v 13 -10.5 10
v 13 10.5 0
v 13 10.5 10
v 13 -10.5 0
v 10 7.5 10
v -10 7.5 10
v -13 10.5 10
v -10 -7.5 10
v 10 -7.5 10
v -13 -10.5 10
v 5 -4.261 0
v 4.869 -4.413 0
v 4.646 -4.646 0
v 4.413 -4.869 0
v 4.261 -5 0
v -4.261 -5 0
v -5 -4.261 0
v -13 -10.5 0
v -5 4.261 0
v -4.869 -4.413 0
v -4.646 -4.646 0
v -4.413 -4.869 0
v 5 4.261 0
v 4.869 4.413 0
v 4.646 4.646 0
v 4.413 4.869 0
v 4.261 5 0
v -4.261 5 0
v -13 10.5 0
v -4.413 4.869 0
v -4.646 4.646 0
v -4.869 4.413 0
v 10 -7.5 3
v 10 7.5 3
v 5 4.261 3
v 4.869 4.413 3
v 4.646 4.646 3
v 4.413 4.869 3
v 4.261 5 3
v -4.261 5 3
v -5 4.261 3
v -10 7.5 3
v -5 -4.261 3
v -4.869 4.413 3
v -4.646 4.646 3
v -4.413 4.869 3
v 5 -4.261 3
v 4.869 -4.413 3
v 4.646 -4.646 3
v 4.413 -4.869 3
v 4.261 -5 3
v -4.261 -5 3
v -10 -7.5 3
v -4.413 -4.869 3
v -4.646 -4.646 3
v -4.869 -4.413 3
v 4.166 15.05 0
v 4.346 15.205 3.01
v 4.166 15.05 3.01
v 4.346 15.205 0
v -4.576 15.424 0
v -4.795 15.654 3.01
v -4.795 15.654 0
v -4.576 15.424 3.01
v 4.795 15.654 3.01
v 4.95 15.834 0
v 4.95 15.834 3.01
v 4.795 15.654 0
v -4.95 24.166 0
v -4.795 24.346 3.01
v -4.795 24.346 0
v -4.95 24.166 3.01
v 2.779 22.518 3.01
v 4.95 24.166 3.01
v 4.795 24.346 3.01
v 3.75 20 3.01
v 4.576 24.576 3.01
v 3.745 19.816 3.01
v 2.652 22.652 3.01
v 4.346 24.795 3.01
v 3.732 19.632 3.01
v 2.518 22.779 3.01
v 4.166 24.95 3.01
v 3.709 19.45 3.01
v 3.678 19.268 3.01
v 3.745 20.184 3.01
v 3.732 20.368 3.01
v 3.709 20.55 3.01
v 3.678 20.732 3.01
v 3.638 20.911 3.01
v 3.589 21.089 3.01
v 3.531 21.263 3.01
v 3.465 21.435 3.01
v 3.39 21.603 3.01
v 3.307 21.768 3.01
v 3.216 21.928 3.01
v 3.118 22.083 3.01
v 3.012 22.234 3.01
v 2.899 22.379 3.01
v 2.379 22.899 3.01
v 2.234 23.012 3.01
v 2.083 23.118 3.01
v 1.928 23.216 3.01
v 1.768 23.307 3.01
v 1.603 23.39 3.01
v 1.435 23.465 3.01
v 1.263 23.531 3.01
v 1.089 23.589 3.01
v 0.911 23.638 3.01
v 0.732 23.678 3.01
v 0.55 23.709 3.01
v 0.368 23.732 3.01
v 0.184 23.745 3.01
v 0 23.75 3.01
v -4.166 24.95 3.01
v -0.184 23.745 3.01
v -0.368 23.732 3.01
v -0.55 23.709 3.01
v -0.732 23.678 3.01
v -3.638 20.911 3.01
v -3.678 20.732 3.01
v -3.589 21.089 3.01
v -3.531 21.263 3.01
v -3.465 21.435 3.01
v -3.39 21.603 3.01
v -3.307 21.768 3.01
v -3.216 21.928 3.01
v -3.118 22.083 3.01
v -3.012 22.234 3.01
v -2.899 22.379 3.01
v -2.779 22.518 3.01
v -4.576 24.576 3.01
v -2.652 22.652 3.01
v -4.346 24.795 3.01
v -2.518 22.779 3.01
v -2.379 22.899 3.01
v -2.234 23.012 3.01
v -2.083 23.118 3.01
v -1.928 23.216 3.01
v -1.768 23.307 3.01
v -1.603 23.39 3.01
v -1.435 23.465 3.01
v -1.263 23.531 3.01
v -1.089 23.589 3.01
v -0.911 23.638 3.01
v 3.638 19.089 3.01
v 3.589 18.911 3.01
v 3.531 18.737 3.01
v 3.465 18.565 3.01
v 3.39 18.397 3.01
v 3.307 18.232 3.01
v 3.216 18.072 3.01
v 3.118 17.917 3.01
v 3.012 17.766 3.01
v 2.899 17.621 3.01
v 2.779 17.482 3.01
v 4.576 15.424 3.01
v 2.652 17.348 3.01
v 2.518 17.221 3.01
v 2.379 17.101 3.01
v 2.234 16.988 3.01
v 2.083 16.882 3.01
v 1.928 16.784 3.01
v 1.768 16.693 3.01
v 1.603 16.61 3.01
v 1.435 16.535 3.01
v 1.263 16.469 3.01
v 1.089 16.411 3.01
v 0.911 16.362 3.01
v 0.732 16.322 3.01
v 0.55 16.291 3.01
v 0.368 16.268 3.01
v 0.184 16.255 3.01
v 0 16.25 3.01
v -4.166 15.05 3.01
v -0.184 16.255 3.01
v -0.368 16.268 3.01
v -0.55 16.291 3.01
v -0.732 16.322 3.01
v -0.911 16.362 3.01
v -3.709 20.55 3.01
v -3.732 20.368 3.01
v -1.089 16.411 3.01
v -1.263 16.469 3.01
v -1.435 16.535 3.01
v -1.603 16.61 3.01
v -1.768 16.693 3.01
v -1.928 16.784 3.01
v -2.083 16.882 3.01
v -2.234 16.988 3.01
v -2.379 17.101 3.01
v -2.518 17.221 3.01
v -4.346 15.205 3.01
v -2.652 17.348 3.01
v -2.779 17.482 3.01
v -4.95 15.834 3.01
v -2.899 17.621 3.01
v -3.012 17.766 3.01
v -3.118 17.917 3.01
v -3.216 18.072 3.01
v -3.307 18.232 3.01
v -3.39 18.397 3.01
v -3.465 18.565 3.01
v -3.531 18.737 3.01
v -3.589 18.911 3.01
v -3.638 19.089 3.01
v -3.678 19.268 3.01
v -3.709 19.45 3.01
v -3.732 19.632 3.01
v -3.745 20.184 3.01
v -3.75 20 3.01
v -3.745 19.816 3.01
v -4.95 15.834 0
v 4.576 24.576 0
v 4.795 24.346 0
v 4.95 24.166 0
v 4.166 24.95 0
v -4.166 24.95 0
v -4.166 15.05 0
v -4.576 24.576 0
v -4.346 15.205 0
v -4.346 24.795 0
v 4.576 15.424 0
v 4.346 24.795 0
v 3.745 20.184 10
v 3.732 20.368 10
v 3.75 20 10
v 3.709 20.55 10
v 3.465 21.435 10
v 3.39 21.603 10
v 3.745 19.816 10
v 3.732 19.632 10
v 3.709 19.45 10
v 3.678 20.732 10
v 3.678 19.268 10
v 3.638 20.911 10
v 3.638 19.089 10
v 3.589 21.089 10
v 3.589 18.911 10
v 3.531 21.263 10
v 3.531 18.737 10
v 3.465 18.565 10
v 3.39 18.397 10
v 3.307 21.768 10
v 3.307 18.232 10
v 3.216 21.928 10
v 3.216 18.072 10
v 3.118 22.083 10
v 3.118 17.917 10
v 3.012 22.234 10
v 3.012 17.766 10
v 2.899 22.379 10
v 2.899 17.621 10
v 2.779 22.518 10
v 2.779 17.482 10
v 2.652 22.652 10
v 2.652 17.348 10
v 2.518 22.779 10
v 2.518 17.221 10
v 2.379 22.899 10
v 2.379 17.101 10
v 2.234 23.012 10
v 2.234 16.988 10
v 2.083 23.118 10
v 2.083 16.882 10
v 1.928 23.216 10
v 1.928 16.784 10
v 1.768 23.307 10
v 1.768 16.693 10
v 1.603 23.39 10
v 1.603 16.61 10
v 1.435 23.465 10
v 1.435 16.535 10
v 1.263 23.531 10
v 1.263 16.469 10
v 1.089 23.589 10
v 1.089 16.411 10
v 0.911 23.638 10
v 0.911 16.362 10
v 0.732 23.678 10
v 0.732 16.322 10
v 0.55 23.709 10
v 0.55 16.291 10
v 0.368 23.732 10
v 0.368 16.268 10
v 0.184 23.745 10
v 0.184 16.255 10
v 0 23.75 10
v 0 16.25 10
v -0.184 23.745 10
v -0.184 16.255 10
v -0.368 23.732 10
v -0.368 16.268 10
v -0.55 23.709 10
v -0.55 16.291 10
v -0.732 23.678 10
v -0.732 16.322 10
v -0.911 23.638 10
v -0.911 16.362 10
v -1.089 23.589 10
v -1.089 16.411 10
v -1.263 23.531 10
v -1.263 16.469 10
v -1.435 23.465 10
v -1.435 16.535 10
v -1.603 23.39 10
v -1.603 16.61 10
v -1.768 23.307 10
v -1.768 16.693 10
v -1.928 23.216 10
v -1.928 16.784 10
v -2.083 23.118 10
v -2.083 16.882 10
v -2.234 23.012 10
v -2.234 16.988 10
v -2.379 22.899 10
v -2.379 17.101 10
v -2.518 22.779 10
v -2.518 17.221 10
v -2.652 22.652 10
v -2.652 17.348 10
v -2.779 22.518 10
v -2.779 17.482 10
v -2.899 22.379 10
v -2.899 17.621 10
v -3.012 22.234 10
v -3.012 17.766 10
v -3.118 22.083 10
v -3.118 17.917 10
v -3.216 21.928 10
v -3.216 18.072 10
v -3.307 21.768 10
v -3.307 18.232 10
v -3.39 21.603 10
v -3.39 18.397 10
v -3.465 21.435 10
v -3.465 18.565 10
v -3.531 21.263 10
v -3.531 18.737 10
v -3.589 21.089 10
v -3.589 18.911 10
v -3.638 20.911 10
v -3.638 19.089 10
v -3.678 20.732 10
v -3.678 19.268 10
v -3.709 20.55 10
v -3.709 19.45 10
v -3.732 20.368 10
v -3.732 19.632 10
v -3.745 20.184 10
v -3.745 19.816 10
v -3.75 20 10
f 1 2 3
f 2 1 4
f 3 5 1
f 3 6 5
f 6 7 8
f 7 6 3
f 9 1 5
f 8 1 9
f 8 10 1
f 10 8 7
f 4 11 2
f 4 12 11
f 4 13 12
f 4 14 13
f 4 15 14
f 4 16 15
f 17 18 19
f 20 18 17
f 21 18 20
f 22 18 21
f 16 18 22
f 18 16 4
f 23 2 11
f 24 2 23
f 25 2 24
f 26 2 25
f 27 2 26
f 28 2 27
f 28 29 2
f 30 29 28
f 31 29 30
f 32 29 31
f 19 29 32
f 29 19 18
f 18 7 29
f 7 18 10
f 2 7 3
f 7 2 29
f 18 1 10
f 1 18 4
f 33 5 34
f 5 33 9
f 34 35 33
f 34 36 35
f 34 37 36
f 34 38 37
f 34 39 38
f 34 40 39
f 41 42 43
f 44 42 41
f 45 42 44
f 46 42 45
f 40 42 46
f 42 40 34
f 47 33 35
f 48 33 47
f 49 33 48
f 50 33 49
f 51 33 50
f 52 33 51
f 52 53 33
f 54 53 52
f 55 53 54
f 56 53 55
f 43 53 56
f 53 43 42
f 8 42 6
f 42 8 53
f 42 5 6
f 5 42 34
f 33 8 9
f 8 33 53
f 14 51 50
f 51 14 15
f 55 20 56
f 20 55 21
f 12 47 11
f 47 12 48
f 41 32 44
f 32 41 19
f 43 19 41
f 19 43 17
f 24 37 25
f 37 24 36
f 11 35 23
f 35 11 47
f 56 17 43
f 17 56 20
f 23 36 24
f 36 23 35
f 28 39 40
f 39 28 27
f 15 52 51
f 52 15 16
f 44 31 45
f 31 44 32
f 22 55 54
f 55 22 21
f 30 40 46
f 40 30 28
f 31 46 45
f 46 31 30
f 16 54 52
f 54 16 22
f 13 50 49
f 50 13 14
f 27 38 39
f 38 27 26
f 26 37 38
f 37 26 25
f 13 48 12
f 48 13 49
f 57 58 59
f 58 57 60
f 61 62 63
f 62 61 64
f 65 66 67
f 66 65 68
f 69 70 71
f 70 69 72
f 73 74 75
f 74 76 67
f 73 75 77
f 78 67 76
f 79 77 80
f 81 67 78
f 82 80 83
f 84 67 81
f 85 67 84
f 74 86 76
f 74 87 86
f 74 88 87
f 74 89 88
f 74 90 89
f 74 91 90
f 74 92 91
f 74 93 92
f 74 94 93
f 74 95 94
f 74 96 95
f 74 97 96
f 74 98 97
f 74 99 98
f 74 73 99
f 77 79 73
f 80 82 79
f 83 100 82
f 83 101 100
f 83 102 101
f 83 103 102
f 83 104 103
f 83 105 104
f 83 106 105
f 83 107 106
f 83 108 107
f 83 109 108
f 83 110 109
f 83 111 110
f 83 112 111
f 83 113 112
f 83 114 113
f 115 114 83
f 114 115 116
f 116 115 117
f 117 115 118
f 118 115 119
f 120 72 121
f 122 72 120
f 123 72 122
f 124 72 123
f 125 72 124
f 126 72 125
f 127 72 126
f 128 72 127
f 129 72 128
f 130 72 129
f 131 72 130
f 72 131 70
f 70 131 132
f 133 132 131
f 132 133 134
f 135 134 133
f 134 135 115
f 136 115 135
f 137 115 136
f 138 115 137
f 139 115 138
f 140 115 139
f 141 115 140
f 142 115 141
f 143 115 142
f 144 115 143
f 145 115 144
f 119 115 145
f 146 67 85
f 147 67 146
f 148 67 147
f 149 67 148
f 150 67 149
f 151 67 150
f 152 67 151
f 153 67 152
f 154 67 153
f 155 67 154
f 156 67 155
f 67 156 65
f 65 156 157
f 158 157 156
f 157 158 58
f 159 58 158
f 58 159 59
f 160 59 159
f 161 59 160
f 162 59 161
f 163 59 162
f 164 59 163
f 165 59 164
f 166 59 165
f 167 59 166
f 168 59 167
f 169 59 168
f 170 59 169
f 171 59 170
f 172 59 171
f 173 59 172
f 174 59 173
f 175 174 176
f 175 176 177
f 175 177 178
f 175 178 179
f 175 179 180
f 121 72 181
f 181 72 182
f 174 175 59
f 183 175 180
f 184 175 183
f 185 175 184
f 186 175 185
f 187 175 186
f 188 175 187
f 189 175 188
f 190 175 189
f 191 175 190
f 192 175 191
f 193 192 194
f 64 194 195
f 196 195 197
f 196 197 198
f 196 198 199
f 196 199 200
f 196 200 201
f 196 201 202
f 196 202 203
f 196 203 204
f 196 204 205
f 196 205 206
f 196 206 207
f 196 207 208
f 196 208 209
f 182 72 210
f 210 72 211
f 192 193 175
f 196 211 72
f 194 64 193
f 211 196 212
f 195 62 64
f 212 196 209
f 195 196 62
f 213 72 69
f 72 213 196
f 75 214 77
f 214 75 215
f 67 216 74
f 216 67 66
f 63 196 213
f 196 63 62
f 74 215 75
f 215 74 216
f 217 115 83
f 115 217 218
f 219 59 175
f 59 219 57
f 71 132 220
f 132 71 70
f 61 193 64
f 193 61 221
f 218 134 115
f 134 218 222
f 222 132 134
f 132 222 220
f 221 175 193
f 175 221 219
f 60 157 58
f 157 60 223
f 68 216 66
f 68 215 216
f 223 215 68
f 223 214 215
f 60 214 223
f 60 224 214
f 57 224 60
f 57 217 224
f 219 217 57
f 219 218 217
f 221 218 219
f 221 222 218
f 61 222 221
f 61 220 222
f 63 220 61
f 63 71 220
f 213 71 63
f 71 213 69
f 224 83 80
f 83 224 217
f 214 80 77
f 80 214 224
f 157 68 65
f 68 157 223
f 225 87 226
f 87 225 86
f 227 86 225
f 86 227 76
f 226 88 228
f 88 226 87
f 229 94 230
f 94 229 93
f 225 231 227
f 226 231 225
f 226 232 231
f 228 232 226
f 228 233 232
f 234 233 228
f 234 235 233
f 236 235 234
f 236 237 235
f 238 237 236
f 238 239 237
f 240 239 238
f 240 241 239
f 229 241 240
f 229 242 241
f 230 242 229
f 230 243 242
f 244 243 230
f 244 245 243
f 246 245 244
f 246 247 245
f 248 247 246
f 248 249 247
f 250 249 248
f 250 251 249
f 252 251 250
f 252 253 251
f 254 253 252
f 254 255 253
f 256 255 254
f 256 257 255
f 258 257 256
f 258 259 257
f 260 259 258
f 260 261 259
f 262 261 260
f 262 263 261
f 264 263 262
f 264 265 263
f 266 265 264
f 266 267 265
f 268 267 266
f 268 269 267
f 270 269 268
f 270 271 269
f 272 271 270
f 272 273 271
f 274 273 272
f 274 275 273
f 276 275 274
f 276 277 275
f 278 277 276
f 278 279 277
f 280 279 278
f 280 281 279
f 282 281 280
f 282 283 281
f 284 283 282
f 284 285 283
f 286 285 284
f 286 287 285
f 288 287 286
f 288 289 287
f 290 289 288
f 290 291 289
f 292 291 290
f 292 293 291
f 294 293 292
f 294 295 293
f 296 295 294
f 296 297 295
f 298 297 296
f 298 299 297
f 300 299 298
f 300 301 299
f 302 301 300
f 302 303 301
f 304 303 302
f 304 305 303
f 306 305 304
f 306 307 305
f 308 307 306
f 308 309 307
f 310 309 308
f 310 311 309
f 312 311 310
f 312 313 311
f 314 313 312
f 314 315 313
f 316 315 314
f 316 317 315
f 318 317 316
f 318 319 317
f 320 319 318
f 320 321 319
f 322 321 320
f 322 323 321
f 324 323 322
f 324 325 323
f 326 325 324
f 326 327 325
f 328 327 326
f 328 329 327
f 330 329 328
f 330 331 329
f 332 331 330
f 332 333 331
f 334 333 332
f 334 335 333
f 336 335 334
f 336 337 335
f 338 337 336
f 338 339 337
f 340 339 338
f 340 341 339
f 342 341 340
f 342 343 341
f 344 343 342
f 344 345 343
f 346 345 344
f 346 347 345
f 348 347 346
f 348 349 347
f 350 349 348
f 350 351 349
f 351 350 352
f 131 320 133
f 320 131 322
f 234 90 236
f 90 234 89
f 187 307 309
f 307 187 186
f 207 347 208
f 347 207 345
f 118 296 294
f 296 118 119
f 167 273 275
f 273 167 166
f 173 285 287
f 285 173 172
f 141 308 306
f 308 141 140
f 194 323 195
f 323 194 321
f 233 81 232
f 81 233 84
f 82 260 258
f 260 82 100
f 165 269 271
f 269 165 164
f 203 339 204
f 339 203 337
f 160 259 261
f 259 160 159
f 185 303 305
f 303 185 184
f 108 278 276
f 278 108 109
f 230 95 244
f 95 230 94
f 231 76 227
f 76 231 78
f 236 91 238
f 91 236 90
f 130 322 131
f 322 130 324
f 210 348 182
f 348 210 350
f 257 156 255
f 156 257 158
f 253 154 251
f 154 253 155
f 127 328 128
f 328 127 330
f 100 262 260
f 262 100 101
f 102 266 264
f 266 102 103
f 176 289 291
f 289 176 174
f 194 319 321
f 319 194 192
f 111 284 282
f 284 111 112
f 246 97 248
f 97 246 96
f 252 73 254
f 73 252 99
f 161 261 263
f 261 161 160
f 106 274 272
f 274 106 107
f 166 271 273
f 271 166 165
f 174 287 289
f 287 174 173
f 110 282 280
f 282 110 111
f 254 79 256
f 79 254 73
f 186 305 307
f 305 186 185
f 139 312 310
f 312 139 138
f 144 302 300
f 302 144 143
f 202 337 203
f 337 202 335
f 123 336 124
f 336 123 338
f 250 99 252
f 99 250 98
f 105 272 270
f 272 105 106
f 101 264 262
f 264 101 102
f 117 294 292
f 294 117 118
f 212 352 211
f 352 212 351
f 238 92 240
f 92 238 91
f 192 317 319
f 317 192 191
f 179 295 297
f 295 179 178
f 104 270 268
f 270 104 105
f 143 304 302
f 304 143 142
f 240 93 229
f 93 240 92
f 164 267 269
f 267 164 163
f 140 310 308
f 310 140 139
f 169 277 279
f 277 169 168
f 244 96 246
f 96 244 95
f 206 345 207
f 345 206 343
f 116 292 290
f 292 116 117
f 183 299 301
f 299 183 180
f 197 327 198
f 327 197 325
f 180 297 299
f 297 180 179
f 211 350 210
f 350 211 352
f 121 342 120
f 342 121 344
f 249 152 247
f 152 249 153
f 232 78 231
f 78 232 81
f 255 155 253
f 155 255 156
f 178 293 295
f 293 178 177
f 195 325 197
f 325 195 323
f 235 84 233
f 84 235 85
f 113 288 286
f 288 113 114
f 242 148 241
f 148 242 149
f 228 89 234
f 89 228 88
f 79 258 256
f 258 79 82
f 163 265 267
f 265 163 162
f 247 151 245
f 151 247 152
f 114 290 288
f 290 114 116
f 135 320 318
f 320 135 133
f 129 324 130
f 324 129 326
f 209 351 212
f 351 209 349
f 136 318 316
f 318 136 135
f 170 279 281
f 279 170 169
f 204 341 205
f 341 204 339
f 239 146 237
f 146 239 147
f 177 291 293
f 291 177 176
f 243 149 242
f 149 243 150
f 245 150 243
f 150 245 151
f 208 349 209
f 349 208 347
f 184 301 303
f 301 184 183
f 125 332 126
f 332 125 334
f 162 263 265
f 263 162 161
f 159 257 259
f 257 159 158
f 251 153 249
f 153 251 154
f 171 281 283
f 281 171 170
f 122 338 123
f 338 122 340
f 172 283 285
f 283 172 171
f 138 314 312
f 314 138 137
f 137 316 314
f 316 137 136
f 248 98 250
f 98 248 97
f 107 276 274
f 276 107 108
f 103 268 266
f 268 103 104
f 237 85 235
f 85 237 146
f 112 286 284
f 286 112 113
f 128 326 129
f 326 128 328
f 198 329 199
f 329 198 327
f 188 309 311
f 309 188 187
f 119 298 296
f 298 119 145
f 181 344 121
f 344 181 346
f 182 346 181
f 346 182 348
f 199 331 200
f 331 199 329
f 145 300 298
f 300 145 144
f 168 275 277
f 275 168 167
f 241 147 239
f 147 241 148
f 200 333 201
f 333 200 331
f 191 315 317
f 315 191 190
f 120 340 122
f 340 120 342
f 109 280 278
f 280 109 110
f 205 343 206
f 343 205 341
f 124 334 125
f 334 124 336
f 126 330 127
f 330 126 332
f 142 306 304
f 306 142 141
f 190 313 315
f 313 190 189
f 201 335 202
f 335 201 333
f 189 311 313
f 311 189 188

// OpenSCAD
l = 20;
w =15;
h = 7;
diameter = 7.5;
t = 3; //wall thickness*2
base = 10;
eps = 0.01;
fillet = 0.5;
tolerance = 0.1;
disp = 20;
faces = 128;

module molde(){
    difference(){
        
        translate([-(l/2 + t),-(w/2 + t),0]) 
            cube([l+t*2, w+t*2, h+t]);

        translate([-l/2,-w/2,t]) 
            cube([l,w,h+eps]);
        
        translate([0,0,-eps]) 
            linear_extrude(t+eps*2)
                intersection(){
                    translate([-base/2, -base/2]) 
                        square([base,base]);    
                    translate ([0,0,t/2]) 
                        circle((sqrt(2)*base)/2-fillet, $fn=faces);
                };
    }
};
molde();

module perno(){
 
    linear_extrude(t+eps)
                intersection(){
                    translate([-(base-tolerance)/2, -(base-tolerance)/2]) 
                        square([base-tolerance,base-tolerance]);
                            
                    translate ([0,0,t]) 
                        circle((sqrt(2)*base)/2-fillet-tolerance, $fn=faces);
                };
    translate([0,0,t/2])
                cylinder(h+t/2,d=diameter,$fn=faces);
    
};
color("red") translate([0,disp,0]) perno();
